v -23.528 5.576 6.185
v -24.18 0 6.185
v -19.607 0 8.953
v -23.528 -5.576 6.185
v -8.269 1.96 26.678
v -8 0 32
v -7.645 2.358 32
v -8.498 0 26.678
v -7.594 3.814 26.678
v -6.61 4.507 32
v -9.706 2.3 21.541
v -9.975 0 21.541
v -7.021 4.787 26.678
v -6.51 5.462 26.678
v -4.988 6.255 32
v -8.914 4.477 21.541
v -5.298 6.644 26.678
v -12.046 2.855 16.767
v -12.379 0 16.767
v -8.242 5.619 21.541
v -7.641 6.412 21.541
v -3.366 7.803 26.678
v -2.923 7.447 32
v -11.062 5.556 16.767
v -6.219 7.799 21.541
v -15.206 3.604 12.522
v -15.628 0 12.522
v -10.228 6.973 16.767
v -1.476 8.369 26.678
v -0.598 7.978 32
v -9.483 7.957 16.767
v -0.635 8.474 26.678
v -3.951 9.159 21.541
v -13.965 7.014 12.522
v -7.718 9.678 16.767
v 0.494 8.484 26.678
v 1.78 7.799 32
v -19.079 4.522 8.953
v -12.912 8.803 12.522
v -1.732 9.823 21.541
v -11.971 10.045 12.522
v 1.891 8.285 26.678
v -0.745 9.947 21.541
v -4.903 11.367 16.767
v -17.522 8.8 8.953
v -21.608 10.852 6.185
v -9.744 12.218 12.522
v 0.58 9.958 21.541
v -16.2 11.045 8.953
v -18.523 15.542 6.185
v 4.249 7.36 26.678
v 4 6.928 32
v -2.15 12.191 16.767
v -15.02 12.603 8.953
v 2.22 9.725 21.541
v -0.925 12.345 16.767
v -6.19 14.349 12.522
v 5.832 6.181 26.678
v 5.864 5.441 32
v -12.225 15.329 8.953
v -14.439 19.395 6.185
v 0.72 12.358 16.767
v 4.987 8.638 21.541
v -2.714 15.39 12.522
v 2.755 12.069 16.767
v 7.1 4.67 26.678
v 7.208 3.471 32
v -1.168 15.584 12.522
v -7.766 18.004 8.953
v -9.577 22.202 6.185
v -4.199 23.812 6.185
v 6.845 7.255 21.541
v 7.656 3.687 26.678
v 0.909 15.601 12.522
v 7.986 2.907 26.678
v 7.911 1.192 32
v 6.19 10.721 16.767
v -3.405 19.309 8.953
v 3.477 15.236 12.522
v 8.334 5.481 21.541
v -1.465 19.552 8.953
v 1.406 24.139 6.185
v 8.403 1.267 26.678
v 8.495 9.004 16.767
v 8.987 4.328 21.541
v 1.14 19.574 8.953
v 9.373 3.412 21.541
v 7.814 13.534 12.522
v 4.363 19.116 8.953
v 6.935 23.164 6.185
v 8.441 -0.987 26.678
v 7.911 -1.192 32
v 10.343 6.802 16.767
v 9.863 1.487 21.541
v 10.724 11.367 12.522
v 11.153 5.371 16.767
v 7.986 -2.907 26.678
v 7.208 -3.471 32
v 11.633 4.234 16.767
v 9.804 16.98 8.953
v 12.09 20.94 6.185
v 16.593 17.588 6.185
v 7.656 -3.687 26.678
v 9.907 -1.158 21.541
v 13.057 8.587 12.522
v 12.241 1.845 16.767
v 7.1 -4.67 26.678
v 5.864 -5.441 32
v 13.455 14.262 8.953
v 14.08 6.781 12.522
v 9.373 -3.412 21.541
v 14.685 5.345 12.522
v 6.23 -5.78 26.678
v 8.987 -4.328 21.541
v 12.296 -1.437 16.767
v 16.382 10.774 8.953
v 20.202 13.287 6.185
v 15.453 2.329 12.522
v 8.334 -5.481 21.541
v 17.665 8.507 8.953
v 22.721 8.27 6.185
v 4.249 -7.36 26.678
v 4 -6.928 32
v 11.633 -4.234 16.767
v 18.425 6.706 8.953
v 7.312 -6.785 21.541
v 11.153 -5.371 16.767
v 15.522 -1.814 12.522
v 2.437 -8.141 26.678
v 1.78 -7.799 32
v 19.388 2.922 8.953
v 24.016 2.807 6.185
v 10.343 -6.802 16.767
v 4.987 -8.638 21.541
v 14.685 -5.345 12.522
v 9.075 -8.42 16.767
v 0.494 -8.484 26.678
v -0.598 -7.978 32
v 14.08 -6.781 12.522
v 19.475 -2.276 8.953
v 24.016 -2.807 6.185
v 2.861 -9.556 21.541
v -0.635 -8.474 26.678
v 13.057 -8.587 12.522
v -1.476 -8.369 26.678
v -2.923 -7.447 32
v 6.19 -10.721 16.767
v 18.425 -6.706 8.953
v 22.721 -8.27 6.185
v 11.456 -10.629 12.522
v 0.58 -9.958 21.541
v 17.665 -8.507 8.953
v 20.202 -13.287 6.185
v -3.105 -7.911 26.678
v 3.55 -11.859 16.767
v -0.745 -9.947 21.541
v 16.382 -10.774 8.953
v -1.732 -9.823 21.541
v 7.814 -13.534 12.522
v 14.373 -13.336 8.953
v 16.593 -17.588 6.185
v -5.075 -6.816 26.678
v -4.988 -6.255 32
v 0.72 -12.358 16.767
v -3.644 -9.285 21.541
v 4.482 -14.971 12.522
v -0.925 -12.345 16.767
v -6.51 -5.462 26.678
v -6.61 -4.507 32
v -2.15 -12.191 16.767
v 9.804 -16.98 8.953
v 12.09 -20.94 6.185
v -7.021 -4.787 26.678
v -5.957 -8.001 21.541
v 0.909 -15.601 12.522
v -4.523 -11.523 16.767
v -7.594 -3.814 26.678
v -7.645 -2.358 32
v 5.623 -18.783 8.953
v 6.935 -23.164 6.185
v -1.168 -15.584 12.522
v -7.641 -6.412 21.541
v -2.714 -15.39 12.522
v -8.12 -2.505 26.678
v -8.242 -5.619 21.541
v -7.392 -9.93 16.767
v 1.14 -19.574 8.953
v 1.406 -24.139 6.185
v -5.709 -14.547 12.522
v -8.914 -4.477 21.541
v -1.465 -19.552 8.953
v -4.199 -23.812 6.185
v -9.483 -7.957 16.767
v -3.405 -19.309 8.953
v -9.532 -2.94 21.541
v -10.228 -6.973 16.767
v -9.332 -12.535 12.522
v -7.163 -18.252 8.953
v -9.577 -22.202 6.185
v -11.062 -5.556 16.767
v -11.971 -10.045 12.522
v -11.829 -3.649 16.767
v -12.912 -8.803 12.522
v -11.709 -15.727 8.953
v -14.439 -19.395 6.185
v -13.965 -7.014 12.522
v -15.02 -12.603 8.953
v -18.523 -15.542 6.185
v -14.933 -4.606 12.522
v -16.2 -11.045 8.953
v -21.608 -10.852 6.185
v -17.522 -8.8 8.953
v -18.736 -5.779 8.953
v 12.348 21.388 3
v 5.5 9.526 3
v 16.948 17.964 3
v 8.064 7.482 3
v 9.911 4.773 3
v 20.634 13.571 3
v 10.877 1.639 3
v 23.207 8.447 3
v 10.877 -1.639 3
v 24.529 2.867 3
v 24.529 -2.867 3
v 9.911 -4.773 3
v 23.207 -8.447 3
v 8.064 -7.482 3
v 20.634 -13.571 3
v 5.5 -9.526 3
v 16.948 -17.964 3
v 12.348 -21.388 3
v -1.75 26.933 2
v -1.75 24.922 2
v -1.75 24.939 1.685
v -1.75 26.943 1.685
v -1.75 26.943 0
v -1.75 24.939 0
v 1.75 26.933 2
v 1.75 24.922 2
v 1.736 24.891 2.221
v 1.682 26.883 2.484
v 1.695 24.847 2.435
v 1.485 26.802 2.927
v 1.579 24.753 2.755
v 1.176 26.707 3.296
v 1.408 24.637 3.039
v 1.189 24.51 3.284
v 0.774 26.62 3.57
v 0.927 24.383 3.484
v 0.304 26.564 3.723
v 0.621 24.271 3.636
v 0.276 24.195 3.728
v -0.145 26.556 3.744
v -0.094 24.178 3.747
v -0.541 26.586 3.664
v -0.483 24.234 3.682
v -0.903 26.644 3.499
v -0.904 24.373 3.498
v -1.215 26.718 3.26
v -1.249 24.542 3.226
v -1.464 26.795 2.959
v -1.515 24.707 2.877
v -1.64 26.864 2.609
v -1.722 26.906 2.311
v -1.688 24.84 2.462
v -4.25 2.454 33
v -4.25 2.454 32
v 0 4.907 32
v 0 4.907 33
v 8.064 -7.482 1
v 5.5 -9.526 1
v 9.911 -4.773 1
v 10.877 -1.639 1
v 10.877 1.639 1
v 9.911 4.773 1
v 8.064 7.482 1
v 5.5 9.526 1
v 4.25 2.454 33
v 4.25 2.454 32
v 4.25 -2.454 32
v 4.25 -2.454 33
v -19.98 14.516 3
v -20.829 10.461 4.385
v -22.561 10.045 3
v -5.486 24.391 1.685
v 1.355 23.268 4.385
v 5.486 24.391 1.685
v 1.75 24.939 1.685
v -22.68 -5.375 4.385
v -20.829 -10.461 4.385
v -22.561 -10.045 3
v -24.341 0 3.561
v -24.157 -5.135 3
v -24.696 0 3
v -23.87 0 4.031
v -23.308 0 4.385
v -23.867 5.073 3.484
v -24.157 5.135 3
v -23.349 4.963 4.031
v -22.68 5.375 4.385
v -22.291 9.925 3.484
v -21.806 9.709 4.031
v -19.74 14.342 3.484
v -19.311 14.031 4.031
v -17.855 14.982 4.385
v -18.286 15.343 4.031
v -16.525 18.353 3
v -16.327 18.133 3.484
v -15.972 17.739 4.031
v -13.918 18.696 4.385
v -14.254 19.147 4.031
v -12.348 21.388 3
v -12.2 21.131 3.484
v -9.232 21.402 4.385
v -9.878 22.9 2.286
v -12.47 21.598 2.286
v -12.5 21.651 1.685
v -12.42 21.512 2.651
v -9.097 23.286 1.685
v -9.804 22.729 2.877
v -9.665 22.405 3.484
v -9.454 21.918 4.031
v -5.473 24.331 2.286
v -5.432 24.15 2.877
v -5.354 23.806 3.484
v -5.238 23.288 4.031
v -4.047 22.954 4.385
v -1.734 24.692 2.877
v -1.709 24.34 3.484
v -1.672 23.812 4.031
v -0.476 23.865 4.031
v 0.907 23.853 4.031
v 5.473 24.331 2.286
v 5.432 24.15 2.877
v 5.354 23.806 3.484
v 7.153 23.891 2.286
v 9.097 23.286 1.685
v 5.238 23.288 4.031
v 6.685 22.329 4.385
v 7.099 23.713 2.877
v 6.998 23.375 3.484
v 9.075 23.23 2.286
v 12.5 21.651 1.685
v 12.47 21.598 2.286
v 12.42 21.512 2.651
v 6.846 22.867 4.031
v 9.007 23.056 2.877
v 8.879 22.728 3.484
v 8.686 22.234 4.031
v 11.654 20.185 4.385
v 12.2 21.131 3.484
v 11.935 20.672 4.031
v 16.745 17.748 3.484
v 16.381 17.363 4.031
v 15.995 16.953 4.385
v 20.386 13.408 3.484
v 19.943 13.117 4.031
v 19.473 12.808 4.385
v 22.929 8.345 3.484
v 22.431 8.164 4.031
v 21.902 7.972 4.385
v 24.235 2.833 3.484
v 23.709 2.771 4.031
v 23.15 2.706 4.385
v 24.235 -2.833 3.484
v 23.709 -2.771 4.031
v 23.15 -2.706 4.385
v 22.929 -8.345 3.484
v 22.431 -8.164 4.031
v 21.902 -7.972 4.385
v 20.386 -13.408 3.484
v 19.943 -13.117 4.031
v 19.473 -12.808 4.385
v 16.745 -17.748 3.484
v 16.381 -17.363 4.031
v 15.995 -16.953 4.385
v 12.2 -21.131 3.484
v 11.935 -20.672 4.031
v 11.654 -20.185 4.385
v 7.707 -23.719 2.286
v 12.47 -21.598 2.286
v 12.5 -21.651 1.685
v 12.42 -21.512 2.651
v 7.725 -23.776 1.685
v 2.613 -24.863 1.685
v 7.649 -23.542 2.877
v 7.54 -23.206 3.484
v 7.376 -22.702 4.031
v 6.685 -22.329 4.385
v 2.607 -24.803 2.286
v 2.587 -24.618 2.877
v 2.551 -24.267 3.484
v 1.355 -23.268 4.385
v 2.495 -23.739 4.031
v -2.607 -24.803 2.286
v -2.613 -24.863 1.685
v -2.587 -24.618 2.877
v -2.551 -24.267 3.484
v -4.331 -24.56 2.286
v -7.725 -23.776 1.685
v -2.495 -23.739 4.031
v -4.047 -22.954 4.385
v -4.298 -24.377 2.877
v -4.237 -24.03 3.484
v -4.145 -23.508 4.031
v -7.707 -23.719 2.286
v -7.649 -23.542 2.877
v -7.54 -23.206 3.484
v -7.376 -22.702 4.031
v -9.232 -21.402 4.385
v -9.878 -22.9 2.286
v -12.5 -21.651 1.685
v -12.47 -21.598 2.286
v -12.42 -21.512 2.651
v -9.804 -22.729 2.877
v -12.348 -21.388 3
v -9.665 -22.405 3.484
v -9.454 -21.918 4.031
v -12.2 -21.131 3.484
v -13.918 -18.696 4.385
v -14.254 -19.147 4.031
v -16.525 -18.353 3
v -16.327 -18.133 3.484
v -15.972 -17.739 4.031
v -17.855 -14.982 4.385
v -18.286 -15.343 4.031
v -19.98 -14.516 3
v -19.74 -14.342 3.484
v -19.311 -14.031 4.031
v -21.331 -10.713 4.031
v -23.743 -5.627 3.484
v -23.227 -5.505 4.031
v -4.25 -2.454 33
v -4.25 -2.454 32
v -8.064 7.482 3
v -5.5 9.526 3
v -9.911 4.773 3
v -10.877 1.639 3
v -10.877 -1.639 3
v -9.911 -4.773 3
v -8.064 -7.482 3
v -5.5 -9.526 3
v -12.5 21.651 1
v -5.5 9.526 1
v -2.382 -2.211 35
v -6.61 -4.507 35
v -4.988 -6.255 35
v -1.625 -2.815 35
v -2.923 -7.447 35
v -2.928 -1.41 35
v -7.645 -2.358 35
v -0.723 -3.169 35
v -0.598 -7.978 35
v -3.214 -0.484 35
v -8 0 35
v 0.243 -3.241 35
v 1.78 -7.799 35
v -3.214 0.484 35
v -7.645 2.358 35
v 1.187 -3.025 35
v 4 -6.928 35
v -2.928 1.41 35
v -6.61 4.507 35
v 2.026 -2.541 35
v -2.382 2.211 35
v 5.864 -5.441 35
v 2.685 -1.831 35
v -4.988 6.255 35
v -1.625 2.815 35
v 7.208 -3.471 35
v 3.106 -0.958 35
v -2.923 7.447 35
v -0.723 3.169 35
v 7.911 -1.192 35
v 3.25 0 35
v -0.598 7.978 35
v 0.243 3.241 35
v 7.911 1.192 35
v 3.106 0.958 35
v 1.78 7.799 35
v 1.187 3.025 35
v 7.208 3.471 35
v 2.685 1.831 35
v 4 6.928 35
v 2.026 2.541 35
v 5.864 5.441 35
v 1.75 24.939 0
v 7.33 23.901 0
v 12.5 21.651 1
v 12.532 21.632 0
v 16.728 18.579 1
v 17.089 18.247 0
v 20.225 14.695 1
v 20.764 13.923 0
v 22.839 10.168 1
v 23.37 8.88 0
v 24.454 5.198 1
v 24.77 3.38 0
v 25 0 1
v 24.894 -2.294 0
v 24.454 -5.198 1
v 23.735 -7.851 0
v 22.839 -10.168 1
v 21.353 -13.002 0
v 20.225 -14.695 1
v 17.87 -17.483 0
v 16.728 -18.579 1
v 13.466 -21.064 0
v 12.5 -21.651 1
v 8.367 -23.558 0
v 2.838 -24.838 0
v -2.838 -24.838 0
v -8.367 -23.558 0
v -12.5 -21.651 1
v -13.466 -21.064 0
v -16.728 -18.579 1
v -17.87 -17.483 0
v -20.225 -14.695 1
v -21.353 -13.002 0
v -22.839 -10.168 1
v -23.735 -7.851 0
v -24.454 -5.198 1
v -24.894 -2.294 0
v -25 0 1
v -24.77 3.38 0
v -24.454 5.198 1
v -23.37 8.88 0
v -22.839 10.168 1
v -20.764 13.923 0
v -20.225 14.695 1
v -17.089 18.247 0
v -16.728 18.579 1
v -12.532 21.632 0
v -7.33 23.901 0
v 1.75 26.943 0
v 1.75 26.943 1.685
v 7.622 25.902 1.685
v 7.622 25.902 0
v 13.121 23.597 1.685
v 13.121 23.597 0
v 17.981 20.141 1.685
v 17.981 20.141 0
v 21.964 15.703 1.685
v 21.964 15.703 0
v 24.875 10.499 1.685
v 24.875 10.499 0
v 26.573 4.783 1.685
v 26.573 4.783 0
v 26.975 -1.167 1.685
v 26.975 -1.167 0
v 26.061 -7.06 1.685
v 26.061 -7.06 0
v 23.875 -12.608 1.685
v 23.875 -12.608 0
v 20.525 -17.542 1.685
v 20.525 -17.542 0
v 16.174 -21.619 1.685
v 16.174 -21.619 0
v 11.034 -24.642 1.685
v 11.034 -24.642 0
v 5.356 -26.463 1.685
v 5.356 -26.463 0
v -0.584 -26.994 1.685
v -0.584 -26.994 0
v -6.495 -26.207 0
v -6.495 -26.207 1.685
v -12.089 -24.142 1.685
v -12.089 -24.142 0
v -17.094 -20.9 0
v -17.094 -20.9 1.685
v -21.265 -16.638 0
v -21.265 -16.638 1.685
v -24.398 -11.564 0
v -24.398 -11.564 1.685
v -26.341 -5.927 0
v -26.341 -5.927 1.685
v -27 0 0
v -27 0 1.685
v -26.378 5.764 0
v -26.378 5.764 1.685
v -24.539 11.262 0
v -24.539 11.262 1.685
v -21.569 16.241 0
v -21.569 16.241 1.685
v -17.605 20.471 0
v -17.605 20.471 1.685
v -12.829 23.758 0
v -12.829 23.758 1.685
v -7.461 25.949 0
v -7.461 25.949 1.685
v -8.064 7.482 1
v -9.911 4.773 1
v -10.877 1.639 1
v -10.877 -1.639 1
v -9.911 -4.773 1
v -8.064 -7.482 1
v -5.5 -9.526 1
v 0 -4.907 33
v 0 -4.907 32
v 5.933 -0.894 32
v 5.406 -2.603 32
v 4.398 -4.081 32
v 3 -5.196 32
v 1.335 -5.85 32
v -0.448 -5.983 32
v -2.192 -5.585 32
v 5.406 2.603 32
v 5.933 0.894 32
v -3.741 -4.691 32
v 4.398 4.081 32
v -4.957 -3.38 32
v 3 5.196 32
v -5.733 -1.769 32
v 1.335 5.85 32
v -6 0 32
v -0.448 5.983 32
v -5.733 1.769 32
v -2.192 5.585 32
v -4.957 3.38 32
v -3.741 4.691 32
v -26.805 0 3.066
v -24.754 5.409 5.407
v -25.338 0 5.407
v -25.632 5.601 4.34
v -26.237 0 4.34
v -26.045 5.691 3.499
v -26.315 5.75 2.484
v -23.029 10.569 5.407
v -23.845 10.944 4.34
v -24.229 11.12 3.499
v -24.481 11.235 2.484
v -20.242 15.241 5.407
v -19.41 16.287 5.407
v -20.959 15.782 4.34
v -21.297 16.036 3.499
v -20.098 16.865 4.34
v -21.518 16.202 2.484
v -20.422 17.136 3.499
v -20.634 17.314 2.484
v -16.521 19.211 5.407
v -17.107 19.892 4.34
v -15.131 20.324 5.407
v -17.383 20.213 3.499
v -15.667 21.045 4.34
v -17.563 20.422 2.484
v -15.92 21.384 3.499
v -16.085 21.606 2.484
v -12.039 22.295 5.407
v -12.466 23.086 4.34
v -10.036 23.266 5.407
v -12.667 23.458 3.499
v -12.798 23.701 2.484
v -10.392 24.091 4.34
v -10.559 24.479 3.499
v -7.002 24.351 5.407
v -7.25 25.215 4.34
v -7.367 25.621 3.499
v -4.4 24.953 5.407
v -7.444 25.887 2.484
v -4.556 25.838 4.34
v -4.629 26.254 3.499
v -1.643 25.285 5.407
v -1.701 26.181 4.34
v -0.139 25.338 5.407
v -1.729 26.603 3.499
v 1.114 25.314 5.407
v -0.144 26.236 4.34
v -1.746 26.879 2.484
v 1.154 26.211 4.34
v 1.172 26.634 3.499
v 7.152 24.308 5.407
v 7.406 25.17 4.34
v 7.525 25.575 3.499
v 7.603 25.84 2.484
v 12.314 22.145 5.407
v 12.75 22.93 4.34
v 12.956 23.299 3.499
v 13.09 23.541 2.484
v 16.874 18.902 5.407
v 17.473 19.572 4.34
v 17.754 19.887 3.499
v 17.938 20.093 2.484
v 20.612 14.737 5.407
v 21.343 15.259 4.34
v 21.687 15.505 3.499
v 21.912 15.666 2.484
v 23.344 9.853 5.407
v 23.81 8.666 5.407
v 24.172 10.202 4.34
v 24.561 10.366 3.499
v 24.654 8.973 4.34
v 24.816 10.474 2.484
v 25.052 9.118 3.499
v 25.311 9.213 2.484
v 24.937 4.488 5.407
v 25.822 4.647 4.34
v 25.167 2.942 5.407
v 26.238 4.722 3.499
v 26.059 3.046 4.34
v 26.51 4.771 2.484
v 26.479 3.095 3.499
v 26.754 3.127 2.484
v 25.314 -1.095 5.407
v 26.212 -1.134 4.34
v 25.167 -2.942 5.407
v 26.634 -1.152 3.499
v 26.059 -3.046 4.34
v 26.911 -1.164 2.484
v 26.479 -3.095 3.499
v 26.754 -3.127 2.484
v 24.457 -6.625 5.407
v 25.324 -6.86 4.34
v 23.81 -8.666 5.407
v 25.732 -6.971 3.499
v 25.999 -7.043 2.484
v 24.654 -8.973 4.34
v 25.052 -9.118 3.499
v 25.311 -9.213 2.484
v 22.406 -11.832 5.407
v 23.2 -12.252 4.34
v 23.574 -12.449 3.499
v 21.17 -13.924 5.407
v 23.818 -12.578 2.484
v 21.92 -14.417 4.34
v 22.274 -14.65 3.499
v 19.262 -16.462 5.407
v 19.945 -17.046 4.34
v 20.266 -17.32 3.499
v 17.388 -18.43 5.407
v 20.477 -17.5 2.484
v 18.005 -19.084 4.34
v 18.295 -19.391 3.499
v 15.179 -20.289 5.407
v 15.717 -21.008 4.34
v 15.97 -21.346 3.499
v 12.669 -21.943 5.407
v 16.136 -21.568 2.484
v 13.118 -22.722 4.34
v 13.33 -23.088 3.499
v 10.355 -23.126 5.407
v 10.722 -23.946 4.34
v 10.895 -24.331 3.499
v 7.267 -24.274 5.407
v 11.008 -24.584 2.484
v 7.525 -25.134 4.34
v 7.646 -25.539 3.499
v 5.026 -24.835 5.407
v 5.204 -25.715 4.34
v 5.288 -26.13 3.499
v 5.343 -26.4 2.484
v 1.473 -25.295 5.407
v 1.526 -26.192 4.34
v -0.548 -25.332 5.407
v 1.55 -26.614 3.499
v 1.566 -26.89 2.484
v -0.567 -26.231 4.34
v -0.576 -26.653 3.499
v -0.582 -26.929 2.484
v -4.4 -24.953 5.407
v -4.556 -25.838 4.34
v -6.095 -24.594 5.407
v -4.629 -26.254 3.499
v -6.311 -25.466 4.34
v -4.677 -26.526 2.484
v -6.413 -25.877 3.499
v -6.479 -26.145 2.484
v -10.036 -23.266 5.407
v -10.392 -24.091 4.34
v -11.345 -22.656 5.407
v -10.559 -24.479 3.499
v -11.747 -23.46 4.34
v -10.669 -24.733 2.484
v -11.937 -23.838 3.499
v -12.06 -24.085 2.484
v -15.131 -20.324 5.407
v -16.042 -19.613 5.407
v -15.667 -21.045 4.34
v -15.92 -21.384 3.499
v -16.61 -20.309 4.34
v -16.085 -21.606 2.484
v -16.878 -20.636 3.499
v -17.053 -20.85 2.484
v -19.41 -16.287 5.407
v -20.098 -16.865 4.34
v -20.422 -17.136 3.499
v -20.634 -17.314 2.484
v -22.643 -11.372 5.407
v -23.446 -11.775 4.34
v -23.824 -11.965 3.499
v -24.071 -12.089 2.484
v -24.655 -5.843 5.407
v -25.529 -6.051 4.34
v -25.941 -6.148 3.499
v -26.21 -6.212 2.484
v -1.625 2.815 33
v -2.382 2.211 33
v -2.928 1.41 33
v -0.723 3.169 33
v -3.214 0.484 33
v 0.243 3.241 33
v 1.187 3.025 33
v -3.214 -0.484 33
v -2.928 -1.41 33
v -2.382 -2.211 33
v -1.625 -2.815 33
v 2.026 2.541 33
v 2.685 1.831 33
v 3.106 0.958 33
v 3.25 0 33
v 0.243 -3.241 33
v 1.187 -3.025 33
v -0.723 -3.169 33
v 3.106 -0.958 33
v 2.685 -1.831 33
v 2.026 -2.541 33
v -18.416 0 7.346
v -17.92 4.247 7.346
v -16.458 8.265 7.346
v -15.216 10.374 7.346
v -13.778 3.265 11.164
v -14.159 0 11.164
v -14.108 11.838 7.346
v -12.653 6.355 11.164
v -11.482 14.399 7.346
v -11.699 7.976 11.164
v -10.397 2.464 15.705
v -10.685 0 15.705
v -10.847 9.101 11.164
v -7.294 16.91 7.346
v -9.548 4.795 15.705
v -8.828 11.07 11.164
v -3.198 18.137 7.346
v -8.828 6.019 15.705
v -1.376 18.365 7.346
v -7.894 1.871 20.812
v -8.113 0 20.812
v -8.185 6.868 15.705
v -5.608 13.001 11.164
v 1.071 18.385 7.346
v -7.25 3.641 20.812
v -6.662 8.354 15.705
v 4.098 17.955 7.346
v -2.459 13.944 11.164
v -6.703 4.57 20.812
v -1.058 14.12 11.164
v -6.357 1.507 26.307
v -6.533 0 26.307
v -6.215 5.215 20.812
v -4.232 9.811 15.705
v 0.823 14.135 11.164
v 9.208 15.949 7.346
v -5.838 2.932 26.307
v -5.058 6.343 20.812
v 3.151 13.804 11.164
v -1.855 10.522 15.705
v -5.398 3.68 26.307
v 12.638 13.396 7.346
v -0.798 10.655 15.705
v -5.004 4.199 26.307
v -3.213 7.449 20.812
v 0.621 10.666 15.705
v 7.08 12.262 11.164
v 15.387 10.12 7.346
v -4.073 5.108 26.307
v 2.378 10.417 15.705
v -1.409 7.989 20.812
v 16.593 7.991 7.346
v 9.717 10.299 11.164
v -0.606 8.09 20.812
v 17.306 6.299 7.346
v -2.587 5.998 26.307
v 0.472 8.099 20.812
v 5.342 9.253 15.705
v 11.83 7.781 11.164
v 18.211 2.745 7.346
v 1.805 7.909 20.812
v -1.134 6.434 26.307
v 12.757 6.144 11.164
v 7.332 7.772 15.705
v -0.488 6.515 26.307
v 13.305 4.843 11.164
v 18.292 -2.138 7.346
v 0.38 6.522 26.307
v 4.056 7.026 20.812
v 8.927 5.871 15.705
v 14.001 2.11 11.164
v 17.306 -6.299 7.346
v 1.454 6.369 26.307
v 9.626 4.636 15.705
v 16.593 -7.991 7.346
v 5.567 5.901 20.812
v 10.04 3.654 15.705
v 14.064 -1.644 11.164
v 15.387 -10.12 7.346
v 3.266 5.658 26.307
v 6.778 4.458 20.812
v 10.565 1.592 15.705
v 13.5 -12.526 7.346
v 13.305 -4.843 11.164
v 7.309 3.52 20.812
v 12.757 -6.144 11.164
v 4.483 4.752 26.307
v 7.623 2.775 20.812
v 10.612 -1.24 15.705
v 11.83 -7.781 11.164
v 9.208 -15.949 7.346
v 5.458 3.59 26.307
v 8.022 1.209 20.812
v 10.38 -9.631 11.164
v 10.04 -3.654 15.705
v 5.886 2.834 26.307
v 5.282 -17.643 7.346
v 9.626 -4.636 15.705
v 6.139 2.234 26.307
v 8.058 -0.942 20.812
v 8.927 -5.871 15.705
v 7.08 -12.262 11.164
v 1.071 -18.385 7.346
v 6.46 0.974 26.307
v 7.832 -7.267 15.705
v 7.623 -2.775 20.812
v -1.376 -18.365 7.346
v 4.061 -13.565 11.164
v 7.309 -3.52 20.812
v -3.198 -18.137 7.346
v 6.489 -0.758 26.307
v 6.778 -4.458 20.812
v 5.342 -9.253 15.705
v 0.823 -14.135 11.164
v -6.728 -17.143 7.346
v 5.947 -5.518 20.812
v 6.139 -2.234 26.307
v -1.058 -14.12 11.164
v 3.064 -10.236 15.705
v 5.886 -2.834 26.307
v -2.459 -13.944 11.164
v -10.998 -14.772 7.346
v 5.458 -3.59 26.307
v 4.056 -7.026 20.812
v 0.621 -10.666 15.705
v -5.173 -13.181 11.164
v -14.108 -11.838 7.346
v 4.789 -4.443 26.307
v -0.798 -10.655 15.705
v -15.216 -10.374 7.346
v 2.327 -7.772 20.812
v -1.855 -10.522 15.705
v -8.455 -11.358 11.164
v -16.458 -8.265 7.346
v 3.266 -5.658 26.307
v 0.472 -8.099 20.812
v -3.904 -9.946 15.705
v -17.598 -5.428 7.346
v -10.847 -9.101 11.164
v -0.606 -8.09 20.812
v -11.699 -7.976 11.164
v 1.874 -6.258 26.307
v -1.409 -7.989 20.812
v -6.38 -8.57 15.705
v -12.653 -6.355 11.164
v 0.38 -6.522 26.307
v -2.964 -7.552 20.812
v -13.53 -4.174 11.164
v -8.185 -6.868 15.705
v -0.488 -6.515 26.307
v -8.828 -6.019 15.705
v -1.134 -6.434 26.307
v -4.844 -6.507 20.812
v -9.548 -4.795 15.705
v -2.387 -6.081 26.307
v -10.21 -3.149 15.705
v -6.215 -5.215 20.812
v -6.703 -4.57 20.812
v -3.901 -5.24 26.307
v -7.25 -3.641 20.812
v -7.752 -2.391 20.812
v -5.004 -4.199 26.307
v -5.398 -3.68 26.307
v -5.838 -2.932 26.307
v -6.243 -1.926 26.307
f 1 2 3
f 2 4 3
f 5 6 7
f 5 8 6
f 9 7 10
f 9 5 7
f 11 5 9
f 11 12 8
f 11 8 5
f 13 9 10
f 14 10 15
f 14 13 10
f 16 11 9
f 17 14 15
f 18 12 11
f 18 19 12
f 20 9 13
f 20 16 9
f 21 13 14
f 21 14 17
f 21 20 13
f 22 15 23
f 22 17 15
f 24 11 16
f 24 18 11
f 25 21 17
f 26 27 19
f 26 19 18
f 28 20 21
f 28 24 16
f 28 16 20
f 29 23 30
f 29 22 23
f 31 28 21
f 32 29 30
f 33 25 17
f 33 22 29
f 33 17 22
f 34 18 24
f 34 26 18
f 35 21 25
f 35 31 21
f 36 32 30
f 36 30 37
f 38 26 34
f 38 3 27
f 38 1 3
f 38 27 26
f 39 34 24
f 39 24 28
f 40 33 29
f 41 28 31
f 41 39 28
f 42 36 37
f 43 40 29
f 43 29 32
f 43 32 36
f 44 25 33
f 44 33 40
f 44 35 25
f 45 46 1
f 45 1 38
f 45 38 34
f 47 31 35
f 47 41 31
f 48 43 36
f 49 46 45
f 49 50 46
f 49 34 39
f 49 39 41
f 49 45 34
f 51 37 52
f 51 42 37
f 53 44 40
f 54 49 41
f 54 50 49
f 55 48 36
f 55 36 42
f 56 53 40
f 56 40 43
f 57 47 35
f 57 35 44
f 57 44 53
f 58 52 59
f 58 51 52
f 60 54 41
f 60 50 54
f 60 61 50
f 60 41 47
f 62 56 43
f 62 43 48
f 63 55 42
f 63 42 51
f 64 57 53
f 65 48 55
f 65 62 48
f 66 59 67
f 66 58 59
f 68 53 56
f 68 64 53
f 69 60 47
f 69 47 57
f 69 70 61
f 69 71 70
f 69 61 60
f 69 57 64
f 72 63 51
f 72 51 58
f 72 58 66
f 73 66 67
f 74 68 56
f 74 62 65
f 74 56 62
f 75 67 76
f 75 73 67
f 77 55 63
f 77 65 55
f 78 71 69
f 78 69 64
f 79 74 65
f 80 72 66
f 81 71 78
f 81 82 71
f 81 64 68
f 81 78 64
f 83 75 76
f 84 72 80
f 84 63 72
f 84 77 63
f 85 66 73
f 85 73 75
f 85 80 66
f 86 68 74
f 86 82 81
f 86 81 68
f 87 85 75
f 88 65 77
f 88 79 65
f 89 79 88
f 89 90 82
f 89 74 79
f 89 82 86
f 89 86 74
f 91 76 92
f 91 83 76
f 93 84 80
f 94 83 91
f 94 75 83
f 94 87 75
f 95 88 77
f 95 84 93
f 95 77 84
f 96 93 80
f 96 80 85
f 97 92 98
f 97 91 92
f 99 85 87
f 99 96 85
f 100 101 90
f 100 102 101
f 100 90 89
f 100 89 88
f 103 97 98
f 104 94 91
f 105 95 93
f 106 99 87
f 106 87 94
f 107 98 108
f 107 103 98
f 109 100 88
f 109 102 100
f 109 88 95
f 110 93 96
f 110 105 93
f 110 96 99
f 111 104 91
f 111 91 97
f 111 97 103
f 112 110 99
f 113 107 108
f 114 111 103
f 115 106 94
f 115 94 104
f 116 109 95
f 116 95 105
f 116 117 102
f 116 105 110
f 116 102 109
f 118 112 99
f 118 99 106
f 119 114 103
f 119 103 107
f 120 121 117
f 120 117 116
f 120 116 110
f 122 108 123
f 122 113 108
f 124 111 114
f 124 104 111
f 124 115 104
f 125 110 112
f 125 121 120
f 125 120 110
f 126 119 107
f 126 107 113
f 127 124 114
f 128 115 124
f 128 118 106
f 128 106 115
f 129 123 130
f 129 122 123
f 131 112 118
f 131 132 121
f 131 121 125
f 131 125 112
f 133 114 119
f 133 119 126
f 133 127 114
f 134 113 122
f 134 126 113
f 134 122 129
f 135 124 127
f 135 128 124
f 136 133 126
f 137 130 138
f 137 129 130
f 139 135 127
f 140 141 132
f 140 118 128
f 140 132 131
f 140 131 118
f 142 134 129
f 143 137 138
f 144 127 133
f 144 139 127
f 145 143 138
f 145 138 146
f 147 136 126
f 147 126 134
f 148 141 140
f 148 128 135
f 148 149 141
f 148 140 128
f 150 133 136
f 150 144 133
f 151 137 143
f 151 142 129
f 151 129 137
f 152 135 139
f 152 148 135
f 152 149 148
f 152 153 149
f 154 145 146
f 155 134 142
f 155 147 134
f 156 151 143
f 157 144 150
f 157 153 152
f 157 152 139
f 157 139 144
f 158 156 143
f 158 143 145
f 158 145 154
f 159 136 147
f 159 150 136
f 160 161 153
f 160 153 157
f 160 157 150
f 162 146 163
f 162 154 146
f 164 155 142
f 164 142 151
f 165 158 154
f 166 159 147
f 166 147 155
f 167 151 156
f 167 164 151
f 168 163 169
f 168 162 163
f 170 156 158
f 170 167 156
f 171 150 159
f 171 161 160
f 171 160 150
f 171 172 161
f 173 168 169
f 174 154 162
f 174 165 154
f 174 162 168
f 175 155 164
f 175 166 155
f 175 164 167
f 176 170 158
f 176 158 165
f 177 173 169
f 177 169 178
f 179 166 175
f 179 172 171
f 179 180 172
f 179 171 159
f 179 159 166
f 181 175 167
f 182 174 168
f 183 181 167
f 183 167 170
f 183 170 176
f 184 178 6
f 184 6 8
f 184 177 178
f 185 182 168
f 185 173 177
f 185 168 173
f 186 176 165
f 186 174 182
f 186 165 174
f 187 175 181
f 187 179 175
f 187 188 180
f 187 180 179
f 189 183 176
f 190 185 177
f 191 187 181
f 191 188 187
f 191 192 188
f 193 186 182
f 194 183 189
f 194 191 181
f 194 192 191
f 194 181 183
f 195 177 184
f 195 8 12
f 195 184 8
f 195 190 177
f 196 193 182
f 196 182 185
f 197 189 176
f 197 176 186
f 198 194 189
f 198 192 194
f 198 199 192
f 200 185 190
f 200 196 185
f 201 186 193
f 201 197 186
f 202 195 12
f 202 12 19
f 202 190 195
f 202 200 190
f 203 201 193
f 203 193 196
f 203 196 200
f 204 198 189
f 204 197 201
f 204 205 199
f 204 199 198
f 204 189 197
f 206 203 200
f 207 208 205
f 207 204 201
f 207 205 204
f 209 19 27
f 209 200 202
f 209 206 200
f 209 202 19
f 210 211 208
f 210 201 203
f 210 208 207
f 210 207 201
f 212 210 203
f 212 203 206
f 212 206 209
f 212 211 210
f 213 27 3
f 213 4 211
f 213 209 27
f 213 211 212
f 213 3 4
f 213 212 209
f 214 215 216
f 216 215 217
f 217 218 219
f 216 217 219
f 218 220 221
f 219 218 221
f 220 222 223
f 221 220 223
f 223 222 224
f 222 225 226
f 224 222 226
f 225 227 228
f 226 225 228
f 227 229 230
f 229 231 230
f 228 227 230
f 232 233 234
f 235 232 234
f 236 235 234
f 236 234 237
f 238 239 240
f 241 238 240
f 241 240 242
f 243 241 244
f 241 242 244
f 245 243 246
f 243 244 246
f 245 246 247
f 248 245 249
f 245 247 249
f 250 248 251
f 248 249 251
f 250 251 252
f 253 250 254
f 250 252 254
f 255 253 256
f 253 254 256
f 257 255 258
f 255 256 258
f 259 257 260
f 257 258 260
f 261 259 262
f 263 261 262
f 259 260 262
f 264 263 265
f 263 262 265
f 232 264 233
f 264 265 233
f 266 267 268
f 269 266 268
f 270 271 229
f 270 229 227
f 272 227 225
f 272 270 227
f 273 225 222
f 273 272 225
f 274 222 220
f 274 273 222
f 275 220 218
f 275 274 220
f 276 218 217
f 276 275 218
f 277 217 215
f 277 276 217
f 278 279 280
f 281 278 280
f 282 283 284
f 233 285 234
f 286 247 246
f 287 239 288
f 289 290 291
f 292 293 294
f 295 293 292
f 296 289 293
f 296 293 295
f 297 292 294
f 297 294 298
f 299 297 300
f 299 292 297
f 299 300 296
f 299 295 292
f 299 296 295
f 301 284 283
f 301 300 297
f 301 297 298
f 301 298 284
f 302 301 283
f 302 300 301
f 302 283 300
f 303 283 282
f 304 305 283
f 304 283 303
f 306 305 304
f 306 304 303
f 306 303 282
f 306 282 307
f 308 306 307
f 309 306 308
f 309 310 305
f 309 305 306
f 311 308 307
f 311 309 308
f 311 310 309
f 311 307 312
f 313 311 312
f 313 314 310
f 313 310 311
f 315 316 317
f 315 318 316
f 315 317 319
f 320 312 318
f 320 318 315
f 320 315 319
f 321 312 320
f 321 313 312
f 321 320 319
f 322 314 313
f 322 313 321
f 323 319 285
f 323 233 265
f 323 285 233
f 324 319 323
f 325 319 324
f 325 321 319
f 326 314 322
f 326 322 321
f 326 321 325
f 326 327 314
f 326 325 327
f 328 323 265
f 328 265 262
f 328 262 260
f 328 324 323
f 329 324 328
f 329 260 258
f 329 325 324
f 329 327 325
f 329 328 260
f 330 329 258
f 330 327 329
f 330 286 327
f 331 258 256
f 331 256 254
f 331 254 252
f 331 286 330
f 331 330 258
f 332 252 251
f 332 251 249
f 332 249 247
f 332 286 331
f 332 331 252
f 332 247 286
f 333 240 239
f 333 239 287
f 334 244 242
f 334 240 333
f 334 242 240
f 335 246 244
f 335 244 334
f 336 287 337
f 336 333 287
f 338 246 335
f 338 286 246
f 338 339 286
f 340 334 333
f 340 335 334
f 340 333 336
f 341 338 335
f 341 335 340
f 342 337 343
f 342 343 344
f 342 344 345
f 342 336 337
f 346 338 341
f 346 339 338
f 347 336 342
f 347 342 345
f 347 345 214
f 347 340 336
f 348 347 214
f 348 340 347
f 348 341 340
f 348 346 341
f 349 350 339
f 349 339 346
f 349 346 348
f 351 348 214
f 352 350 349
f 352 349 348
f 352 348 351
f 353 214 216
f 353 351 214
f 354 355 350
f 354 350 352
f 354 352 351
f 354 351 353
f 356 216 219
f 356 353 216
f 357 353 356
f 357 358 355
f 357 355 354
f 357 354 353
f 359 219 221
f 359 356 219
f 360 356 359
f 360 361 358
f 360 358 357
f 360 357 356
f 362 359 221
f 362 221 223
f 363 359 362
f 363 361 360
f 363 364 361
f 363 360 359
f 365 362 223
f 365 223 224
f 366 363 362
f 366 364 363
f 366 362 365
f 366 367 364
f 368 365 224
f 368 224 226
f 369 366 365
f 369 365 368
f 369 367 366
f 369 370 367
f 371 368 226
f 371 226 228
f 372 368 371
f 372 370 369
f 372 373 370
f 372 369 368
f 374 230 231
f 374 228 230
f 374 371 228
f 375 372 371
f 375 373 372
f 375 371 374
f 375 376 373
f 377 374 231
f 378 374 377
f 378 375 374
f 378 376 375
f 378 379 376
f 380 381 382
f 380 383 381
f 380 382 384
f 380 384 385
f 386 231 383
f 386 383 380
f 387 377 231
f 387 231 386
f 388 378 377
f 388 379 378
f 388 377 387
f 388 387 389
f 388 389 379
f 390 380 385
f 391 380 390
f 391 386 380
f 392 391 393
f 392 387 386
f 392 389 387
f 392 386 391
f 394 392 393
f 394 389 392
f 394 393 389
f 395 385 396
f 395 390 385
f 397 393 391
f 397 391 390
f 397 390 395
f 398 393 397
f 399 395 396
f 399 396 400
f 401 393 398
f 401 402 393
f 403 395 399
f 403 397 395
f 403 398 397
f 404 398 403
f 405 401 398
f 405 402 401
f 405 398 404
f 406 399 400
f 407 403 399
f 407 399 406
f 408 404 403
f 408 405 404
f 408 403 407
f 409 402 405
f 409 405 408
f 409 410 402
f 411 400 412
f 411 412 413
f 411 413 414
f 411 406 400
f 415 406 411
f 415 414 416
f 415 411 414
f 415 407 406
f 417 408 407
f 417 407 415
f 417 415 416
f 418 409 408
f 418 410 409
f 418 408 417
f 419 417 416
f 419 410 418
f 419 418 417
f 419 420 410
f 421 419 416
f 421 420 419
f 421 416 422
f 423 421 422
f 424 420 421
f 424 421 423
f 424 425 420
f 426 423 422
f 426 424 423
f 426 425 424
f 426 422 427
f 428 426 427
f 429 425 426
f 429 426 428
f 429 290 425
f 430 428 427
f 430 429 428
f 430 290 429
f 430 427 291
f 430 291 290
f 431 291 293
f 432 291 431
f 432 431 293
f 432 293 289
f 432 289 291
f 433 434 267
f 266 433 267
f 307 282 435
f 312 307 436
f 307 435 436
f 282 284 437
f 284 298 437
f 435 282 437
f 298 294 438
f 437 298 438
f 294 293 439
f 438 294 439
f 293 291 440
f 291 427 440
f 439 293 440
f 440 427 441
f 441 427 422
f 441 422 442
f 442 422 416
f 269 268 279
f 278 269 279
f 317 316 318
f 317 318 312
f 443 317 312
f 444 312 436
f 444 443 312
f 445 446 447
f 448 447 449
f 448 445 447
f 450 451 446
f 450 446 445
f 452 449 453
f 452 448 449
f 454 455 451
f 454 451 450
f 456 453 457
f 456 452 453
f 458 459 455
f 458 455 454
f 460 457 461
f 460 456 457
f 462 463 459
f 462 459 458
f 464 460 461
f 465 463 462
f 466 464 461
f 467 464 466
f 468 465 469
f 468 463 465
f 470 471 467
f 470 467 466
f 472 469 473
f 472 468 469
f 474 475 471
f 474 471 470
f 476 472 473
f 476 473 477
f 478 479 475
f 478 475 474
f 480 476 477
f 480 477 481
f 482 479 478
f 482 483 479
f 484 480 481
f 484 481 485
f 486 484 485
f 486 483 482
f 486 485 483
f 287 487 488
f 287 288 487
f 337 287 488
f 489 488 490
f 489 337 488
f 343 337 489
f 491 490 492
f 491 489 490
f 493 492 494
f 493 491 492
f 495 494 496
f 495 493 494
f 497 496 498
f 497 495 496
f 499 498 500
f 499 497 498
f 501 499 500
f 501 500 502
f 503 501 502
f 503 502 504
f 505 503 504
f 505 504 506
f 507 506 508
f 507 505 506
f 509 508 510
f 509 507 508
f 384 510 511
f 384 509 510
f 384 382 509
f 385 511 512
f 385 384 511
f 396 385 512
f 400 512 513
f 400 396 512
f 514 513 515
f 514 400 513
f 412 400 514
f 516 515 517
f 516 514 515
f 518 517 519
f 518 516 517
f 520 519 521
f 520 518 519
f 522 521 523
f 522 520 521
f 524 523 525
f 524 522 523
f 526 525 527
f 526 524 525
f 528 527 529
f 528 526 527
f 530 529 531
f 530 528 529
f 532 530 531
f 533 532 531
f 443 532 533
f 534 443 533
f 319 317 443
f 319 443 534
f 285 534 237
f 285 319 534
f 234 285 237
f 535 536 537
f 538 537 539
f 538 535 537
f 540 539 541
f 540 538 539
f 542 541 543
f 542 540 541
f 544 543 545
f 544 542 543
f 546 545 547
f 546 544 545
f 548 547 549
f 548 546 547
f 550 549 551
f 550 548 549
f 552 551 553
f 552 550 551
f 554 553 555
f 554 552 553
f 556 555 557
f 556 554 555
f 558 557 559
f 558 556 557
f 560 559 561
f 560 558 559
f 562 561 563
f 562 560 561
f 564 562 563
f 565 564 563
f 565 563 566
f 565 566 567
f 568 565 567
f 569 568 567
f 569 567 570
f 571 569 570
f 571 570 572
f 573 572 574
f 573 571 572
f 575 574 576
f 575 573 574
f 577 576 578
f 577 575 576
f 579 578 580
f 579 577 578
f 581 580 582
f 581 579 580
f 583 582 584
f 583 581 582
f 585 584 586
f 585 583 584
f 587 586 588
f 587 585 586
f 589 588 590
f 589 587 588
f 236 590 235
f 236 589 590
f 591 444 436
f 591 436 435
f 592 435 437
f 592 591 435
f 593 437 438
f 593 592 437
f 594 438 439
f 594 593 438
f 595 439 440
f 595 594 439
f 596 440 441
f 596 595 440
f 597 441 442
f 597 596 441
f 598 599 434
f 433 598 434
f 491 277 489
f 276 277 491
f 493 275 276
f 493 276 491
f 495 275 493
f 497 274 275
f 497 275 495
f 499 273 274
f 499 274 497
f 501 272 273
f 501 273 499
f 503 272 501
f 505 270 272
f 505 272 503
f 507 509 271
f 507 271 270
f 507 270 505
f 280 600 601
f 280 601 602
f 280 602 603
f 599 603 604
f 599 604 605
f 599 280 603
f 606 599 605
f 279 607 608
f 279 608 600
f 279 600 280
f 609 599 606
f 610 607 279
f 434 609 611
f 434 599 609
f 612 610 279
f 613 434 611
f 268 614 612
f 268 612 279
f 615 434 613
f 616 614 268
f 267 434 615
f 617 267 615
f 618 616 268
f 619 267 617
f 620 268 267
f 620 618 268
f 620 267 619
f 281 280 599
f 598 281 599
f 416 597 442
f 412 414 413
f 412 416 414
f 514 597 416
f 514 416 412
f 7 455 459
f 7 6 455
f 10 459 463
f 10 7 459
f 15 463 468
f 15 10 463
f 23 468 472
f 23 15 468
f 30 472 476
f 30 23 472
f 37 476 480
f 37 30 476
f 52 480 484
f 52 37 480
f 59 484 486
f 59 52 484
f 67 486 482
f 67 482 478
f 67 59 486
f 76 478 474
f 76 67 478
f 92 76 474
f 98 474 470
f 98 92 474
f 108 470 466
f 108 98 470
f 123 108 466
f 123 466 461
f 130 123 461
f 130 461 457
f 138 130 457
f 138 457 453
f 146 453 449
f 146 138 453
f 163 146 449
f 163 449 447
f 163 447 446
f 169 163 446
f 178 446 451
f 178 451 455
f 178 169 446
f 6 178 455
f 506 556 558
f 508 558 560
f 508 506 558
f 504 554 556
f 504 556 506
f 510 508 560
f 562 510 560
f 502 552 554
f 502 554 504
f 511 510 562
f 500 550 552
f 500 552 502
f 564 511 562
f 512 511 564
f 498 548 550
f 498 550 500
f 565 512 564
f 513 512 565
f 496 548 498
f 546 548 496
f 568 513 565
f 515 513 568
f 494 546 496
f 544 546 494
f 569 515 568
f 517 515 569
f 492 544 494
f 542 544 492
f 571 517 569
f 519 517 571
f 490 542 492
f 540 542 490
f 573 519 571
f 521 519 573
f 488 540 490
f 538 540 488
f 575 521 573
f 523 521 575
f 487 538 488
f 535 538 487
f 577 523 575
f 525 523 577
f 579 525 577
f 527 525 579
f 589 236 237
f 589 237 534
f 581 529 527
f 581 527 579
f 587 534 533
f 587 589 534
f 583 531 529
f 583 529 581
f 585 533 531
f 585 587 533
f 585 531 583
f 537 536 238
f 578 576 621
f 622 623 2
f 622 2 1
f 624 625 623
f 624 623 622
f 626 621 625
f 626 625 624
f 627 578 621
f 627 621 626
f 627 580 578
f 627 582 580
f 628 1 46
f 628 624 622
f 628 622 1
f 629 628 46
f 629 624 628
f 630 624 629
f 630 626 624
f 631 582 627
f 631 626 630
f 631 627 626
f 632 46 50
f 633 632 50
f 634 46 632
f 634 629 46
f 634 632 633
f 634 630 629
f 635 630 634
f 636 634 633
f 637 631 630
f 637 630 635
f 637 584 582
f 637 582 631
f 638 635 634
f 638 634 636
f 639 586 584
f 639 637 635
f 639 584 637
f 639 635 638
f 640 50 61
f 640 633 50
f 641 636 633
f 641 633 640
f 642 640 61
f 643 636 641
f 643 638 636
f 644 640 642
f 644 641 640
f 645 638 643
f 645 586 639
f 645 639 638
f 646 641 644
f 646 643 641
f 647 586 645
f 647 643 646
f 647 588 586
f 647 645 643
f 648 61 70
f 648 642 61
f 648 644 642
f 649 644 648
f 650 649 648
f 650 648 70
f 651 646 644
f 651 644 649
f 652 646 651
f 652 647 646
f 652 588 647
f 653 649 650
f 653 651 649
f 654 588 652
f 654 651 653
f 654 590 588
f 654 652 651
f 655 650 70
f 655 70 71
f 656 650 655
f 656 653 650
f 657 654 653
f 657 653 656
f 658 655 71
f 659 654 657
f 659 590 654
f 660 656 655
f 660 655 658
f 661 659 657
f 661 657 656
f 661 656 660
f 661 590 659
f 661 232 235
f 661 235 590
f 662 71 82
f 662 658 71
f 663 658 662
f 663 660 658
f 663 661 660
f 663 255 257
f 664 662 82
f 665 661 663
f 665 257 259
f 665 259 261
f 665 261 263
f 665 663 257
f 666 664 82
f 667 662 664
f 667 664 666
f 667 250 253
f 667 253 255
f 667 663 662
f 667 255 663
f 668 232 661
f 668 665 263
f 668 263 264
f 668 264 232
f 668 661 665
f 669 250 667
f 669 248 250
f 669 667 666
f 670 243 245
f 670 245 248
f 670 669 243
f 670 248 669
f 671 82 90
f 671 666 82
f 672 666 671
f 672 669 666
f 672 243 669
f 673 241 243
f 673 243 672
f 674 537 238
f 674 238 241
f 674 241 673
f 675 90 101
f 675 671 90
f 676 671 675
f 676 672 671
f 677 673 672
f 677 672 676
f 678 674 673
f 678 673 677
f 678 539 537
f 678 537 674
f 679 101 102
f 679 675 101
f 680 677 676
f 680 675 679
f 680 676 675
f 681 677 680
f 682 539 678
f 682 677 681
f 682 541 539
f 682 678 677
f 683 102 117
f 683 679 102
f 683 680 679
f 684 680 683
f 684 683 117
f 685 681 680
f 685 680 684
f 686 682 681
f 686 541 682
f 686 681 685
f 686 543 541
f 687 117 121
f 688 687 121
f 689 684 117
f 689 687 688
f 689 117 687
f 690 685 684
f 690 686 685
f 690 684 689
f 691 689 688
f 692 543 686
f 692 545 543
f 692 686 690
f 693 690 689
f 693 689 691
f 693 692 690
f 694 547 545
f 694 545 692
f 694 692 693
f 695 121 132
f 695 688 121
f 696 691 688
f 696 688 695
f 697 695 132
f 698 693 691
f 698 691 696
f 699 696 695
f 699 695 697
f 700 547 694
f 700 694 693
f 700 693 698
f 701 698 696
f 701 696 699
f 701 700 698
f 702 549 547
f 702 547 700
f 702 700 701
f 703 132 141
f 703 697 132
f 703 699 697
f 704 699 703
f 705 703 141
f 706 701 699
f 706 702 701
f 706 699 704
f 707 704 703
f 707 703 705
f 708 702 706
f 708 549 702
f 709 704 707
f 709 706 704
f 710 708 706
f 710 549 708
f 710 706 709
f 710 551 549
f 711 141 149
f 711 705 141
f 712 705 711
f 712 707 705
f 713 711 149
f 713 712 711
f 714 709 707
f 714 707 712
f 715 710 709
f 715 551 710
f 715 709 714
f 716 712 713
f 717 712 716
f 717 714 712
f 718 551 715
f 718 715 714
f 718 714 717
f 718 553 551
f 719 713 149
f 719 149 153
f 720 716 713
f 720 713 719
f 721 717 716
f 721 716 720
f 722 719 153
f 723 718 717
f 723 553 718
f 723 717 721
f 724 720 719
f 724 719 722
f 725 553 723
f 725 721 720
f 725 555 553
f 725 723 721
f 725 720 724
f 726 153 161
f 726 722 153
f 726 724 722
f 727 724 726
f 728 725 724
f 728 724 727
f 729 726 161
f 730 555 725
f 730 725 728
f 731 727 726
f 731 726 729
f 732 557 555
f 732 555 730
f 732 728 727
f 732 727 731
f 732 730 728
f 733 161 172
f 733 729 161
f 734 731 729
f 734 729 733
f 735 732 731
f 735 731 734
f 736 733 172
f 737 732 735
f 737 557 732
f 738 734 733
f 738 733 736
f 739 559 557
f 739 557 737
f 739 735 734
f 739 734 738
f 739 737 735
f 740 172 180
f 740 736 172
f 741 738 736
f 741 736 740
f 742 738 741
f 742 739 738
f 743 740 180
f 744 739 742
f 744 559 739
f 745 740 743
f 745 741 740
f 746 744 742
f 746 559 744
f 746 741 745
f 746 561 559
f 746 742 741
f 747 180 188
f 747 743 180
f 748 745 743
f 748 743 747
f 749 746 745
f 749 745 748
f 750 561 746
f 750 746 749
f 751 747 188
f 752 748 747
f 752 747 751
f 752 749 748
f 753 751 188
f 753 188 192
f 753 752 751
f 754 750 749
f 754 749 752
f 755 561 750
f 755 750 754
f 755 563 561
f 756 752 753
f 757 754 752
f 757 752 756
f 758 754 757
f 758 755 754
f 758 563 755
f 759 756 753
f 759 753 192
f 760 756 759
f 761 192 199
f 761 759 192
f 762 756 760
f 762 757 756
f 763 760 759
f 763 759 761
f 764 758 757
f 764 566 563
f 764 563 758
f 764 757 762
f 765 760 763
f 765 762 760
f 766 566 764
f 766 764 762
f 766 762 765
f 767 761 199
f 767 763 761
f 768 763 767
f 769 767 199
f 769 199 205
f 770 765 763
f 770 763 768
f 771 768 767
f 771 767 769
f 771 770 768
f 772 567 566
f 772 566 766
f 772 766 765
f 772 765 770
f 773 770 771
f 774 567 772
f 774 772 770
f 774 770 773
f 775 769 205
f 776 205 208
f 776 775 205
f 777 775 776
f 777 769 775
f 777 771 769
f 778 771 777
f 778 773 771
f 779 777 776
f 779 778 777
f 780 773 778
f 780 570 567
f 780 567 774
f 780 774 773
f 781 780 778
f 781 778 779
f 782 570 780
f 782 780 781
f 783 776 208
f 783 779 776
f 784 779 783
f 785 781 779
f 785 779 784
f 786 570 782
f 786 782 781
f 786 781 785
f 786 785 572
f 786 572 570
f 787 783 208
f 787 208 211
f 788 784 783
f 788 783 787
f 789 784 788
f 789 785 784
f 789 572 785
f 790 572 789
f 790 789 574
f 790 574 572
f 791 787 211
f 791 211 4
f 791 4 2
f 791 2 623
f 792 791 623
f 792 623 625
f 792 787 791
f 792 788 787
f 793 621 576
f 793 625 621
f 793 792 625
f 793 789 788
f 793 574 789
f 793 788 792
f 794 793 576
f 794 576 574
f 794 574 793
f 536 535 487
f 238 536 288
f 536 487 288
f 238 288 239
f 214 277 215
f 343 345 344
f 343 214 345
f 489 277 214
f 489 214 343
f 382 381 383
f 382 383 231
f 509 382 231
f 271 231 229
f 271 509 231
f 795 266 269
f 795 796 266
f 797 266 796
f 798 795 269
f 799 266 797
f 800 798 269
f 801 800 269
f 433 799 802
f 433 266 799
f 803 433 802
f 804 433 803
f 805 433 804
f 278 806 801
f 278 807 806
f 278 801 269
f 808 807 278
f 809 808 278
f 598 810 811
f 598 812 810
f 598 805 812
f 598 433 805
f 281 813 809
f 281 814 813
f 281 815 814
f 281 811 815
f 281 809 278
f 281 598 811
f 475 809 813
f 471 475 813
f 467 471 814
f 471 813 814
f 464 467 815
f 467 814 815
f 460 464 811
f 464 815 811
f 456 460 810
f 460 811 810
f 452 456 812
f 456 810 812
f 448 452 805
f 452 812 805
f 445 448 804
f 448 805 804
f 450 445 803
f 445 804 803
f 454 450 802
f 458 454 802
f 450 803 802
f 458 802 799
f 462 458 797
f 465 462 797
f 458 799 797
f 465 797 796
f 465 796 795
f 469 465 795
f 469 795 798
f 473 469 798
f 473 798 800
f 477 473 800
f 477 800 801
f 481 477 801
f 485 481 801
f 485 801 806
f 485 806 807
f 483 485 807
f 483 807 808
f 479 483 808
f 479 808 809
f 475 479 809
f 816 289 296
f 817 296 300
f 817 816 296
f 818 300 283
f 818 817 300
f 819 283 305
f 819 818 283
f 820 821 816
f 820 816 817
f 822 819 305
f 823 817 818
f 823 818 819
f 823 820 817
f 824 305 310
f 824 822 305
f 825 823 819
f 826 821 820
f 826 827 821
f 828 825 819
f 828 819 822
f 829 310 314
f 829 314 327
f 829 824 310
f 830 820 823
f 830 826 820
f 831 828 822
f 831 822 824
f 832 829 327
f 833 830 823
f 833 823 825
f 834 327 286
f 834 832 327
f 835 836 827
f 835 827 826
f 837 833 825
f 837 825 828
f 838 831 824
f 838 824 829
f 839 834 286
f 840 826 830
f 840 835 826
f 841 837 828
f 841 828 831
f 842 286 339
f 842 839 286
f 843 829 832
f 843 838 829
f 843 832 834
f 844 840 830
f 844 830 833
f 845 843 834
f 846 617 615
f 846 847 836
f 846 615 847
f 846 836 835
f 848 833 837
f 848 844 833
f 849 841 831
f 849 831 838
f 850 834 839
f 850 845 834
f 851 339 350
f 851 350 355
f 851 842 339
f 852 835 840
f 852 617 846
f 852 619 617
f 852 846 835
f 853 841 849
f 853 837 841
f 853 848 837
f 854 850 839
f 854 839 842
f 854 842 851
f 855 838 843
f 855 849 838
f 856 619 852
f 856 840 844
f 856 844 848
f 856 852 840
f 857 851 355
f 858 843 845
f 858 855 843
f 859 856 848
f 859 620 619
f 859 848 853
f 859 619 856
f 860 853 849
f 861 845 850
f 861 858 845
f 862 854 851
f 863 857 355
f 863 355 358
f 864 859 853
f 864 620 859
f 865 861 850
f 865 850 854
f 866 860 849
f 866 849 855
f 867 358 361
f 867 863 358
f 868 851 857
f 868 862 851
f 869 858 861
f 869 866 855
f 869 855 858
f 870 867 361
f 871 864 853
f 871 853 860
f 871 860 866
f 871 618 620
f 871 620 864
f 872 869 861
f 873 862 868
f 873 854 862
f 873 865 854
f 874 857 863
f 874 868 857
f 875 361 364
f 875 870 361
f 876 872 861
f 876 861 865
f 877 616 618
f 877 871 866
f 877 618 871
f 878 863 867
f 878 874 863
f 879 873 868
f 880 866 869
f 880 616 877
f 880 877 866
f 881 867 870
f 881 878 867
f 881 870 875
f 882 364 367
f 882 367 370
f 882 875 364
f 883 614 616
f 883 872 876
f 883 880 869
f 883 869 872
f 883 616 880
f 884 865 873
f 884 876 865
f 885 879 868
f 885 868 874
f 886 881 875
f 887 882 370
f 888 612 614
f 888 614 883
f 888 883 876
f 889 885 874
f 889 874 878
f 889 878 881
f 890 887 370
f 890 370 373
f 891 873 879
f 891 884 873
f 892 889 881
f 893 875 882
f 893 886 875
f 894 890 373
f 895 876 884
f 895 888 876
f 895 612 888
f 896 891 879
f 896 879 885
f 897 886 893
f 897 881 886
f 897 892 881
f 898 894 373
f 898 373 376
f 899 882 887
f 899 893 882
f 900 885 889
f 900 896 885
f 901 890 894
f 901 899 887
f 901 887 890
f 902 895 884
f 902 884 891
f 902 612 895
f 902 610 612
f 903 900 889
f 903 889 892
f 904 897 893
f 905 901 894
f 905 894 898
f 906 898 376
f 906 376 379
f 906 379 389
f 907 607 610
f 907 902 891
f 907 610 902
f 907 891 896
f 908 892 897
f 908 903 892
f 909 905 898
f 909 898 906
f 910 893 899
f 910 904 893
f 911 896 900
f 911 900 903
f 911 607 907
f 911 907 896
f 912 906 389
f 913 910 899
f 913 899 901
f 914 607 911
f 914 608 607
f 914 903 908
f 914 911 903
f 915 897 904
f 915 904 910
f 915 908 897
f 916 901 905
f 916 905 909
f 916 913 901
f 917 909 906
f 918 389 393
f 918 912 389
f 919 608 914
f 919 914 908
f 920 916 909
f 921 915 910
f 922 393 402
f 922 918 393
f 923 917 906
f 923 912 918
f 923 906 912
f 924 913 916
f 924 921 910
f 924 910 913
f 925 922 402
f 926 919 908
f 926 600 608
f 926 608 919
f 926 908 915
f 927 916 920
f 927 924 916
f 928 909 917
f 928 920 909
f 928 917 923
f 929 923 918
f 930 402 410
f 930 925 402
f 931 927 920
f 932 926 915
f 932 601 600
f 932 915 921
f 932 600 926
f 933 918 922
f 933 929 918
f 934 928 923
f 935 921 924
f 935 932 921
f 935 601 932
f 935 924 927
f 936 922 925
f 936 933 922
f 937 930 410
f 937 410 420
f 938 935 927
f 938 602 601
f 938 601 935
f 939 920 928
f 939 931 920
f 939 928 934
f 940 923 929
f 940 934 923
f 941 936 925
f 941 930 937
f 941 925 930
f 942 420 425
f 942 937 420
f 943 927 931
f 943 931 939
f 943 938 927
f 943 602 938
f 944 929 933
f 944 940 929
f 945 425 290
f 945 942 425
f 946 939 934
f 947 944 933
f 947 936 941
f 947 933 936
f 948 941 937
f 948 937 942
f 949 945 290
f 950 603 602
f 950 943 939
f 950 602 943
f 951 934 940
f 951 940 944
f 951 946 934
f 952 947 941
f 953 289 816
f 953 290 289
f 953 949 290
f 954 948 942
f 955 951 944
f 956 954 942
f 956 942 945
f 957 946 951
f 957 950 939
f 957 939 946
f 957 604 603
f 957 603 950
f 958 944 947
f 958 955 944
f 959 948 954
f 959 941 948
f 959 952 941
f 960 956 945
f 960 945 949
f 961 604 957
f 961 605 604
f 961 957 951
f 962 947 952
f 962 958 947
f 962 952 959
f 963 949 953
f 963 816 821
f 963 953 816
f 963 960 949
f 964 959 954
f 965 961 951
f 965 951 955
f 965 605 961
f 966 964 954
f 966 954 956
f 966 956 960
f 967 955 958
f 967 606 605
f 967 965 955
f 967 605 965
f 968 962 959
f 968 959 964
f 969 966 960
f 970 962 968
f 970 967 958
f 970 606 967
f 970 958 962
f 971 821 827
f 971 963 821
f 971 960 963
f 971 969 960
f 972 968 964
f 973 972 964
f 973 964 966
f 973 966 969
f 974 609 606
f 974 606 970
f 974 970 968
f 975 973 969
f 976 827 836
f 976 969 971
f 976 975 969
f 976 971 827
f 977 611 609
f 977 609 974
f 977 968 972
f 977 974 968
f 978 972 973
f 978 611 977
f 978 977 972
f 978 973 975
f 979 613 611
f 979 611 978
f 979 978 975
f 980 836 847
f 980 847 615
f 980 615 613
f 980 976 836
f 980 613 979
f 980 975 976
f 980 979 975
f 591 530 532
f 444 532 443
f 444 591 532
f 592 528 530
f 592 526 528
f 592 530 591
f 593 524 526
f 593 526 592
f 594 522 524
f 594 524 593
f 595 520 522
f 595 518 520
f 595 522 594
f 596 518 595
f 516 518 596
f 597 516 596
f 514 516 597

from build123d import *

# Parameters (mm, degrees)
F3_DEPTH  = 1
F4_R      = 3.25
F5_DEPTH  = 2.001
F8_DEPTH  = 2
F10_DEPTH = 27.001


with BuildPart() as f1:
    # F0 (on Front) → F1 (revolve)
    with BuildSketch(Plane.XZ):
        with BuildLine():
            Line((0, 32), (0, 35))
            Line((0, 35), (-8, 35))
            Line((-8, 35), (-8, 32))
            ThreePointArc((-8, 32), (-12.379208, 16.766787), (-24.179687, 6.184872))
            ThreePointArc((-24.179687, 6.184872), (-26.236652, 4.340318), (-27, 1.684987))
            Line((-27, 1.684987), (-27, 0))
            Line((-27, 0), (-25, 0))
            Line((-25, 0), (-25, 1.684987))
            ThreePointArc((-25, 1.684987), (-24.541991, 3.278186), (-23.307813, 4.384918))
            ThreePointArc((-23.307813, 4.384918), (-10.684547, 15.704655), (-6, 32))
            Line((-6, 32), (0, 32))
        make_face()
    revolve(axis=Axis((0, 0, 17.5), (0, 0, -1)))

    # F2 (on face) → F3 (cut)
    with BuildSketch(Plane(origin=(0, 0, 32), x_dir=(1, 0, 0), z_dir=(0, 0, -1))):
        Polygon((4.25, -2.453739), (4.25, 2.453739), (0, 4.907477), (-4.25, 2.453739), (-4.25, -2.453739), (0, -4.907477), align=None)
    extrude(amount=-F3_DEPTH, mode=Mode.SUBTRACT)

    # F4 (on face) → F5 (cut, through all)
    with BuildSketch(Plane(origin=(0, 0, 33), x_dir=(1, 0, 0), z_dir=(0, 0, -1))):
        Circle(F4_R)
    extrude(amount=-F5_DEPTH, mode=Mode.SUBTRACT)

    # F7 (on offset) → F8 (join)
    with BuildSketch(Plane(origin=(0, 0, 1), x_dir=(1, 0, 0), z_dir=(0, 0, -1))):
        with BuildLine():
            Line((5.5, -9.526279), (12.5, -21.650635))
            ThreePointArc((12.5, -21.650635), (25, 0), (12.5, 21.650635))
            Line((12.5, 21.650635), (5.5, 9.526279))
            ThreePointArc((5.5, 9.526279), (11, 0), (5.5, -9.526279))
        make_face()
        with BuildLine():
            ThreePointArc((-12.5, 21.650635), (-25, 0), (-12.5, -21.650635))
            Line((-12.5, -21.650635), (-5.5, -9.526279))
            ThreePointArc((-5.5, -9.526279), (-11, 0), (-5.5, 9.526279))
            Line((-5.5, 9.526279), (-12.5, 21.650635))
        make_face()
    extrude(amount=-F8_DEPTH)

    # F9 (on Front) → F10 (cut, through all)
    with BuildSketch(Plane.XZ):
        with BuildLine():
            Line((1.75, 0), (1.75, 2))
            ThreePointArc((1.75, 2), (0, 3.75), (-1.75, 2))
            Line((-1.75, 2), (-1.75, 0))
            Line((-1.75, 0), (1.75, 0))
        make_face()
    extrude(amount=-F10_DEPTH, mode=Mode.SUBTRACT)


solid = f1.part
